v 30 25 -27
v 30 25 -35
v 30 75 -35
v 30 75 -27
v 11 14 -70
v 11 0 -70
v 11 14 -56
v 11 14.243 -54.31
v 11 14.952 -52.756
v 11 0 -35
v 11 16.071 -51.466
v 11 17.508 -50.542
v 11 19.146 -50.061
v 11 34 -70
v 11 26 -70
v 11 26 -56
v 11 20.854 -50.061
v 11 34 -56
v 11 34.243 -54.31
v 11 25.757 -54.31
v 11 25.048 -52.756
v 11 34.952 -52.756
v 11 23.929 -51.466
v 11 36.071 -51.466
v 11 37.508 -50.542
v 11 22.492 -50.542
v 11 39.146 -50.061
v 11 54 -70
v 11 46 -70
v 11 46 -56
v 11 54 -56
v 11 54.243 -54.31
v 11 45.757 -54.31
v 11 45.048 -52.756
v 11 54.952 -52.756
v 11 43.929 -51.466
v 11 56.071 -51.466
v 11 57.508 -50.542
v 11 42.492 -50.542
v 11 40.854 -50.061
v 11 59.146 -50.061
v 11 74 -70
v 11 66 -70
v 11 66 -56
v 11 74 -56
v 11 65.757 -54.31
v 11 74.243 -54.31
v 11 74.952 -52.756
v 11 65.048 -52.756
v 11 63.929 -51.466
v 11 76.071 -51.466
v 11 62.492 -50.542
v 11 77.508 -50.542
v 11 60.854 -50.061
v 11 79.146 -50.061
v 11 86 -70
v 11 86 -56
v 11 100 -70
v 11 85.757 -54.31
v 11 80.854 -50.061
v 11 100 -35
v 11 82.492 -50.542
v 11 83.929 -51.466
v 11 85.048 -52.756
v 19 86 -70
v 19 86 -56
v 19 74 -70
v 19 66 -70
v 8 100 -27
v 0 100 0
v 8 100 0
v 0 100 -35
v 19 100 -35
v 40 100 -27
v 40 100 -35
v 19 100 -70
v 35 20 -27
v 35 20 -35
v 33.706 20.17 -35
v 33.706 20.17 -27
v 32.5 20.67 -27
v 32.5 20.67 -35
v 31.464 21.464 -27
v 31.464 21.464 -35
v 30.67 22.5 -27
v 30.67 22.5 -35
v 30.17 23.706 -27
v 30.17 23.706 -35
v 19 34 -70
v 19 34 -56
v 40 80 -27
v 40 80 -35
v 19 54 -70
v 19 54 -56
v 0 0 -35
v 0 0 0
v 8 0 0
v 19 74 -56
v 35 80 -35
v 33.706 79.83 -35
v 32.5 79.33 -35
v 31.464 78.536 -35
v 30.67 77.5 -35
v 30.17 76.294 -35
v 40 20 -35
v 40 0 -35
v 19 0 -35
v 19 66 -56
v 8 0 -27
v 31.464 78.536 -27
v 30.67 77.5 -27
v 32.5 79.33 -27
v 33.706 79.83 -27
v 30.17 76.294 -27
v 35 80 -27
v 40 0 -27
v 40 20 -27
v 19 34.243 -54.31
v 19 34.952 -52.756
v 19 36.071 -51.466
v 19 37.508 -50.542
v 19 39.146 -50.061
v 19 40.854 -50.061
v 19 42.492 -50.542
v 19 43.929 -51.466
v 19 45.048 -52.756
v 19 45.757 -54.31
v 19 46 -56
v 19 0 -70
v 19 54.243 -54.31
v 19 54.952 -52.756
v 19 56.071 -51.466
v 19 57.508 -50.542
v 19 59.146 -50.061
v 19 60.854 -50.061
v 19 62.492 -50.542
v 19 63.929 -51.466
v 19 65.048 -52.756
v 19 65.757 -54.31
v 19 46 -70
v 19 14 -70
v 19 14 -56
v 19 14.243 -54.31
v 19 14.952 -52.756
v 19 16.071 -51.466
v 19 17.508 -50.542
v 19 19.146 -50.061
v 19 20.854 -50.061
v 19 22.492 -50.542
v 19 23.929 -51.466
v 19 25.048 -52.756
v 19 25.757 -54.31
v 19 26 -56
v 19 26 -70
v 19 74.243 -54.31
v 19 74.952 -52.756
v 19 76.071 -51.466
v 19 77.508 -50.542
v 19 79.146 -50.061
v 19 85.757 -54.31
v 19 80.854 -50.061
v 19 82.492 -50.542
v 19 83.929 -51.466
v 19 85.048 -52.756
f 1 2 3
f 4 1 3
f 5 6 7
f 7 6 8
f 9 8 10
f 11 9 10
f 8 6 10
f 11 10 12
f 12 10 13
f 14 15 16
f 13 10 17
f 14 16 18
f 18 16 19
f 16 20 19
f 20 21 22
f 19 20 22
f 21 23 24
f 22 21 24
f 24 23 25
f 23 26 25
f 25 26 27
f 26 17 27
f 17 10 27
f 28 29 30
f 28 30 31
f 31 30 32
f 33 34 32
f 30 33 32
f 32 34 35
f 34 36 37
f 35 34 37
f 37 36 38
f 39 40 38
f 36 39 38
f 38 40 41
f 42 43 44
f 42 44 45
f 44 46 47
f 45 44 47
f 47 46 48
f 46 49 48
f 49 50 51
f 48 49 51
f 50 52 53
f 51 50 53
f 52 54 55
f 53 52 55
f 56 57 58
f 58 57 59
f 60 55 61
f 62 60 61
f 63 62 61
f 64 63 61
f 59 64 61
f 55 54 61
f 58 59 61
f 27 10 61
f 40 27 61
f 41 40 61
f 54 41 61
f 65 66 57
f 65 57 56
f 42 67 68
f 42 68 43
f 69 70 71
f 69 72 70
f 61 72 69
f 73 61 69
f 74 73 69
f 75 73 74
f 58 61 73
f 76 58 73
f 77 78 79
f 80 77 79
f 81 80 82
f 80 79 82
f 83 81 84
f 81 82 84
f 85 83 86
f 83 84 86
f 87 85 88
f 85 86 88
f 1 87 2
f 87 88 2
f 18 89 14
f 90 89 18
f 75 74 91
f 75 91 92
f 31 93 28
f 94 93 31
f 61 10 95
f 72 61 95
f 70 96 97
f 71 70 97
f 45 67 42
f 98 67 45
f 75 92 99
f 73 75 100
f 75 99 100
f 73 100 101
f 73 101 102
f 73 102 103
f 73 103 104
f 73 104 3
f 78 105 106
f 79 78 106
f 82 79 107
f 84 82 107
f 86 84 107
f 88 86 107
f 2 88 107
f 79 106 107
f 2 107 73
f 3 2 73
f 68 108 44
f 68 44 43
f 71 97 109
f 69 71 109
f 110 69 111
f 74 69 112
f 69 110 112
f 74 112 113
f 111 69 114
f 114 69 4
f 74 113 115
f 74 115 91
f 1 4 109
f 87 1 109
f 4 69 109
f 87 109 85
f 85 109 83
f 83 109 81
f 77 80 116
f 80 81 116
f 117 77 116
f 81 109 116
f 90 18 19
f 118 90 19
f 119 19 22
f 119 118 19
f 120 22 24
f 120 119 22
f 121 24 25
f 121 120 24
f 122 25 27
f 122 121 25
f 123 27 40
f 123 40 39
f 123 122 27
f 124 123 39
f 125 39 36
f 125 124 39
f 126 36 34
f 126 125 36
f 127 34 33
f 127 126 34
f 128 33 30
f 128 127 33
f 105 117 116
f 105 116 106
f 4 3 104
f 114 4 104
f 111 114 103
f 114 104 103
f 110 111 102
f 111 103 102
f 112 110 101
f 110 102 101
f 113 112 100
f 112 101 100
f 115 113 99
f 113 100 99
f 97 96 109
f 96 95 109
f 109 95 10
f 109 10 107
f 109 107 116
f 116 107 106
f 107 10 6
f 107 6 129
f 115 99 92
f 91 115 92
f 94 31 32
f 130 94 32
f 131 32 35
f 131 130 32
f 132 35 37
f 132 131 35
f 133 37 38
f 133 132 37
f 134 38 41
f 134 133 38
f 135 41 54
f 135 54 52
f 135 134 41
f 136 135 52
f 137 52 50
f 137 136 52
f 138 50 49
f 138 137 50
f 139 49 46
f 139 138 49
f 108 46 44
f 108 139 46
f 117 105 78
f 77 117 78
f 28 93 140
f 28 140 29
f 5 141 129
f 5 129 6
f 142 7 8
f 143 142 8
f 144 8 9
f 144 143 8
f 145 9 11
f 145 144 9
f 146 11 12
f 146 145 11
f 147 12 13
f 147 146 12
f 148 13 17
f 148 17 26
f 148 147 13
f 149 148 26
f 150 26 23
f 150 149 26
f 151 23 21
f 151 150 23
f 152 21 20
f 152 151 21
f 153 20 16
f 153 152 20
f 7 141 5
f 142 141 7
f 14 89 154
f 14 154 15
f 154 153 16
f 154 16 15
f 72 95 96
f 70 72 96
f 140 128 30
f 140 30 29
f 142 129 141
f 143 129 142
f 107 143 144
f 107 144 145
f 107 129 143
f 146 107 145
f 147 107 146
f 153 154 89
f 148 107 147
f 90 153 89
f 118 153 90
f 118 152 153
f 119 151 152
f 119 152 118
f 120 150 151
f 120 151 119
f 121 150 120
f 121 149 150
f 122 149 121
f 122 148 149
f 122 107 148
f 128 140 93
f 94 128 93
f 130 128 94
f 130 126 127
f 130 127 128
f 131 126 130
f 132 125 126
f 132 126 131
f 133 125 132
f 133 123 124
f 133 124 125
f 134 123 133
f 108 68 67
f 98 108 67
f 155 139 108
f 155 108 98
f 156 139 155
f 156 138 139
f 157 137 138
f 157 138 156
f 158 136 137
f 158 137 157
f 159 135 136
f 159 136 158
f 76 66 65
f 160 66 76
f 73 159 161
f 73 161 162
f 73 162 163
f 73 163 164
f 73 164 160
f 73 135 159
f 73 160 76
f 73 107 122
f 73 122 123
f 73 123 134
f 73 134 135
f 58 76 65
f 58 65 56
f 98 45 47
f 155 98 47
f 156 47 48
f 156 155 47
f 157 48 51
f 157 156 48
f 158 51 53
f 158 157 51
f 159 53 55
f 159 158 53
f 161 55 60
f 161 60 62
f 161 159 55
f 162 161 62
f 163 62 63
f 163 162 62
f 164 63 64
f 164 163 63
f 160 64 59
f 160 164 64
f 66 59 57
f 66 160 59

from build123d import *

# Parameters (mm, degrees)
BOSS_EXTRUDE1_DEPTH = 100
CUT_EXTRUDE1_DEPTH  = 8
SKETCH4_W           = 8
SKETCH4_H           = 100
BOSS_EXTRUDE2_DEPTH = 35
CUT_EXTRUDE2_DEPTH  = 8


with BuildPart() as part:
    # Sketch1 → Boss-Extrude1 (new body)
    with BuildSketch(Plane(origin=(0, 0, 0), x_dir=(1, 0, 0), z_dir=(0, 1, 0))):
        Polygon((0, 0), (8, 0), (8, 27), (40, 27), (40, 35), (0, 35), align=None)
    extrude(amount=BOSS_EXTRUDE1_DEPTH)

    # Sketch3 → Cut-Extrude1 (cut)
    with BuildSketch(Plane(origin=(0, 0, -35), x_dir=(-1, 0, 0), z_dir=(0, 0, -1))):
        with BuildLine():
            Line((-40, 20), (-35, 20))
            ThreePointArc((-35, 20), (-31.464466094, 21.464466094), (-30, 25))
            Line((-30, 25), (-30, 75))
            ThreePointArc((-30, 75), (-31.464466094, 78.535533906), (-35, 80))
            Line((-35, 80), (-40, 80))
            Line((-40, 80), (-40, 20))
        make_face()
    extrude(amount=-CUT_EXTRUDE1_DEPTH, mode=Mode.SUBTRACT)

    # Sketch4 → Boss-Extrude2 (add)
    with BuildSketch(Plane(origin=(0, 0, -35), x_dir=(-1, 0, 0), z_dir=(0, 0, -1))):
        with Locations((-15, 50)):
            Rectangle(SKETCH4_W, SKETCH4_H)
    extrude(amount=BOSS_EXTRUDE2_DEPTH)

    # Sketch5 → Cut-Extrude2 (cut)
    with BuildSketch(Plane(origin=(19, 0, 0), x_dir=(0, 0, -1), z_dir=(1, 0, 0))):
        with BuildLine():
            Line((56, 86), (70, 86))
            Line((70, 86), (70, 74))
            Line((70, 74), (56, 74))
            ThreePointArc((56, 74), (50, 80), (56, 86))
        make_face()
        with BuildLine():
            Line((70, 54), (56, 54))
            ThreePointArc((56, 54), (50, 60), (56, 66))
            Line((56, 66), (70, 66))
            Line((70, 66), (70, 54))
        make_face()
        with BuildLine():
            Line((70, 34), (56, 34))
            ThreePointArc((56, 34), (50, 40), (56, 46))
            Line((56, 46), (70, 46))
            Line((70, 46), (70, 34))
        make_face()
        with BuildLine():
            Line((70, 14), (56, 14))
            ThreePointArc((56, 14), (50, 20), (56, 26))
            Line((56, 26), (70, 26))
            Line((70, 26), (70, 14))
        make_face()
    extrude(amount=-CUT_EXTRUDE2_DEPTH, mode=Mode.SUBTRACT)


solid = part.part
